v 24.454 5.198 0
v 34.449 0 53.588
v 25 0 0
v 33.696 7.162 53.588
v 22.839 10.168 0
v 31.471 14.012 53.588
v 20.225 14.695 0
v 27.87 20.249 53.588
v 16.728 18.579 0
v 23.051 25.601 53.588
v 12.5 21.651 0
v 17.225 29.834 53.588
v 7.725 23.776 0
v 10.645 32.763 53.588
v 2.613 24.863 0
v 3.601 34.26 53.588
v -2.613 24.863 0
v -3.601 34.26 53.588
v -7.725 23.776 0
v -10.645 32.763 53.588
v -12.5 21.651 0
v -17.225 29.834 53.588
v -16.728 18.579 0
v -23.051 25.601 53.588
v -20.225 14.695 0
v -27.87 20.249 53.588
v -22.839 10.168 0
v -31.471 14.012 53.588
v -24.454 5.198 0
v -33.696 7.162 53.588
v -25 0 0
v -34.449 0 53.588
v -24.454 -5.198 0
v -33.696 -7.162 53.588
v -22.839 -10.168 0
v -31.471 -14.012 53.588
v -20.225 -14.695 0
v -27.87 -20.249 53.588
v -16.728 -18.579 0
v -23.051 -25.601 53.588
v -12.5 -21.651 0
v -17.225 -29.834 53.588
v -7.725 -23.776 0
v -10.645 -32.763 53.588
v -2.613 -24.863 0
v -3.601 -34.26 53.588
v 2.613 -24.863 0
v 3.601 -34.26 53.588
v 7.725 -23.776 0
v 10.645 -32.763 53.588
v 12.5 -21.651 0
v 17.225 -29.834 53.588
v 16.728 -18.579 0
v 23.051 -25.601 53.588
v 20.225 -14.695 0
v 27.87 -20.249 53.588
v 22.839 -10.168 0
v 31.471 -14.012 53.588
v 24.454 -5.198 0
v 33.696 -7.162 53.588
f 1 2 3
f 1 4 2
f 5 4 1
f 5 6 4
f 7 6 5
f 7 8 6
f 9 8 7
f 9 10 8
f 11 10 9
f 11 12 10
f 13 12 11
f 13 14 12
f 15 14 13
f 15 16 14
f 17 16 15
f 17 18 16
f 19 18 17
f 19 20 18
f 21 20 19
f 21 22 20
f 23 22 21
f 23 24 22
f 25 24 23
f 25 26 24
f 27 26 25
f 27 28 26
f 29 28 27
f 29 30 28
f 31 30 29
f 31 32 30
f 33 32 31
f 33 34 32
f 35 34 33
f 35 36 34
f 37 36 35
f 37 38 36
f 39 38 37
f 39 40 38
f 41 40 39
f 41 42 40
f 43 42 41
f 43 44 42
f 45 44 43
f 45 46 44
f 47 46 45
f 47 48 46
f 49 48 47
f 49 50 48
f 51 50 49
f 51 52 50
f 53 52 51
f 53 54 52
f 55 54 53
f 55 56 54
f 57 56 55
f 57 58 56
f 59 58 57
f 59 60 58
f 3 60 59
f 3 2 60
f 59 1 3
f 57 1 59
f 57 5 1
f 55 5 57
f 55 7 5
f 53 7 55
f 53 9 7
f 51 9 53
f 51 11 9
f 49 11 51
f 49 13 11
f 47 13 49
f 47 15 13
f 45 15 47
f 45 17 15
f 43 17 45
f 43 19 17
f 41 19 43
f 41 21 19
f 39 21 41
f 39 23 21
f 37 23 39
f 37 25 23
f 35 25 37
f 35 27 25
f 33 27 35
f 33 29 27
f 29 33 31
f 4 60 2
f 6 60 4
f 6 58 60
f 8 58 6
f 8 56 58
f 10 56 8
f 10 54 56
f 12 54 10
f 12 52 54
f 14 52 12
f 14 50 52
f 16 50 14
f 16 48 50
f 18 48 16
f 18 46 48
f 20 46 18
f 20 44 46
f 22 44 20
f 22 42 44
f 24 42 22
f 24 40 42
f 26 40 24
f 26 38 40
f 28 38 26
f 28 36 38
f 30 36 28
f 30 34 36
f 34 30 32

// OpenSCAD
/* conical frustum
  V: Volume
  h: height
  R: bigger radius
  r: smaller radius
  phi: angle between base and cone axis
  
  V=(h*PI)/3 * (R²+R*r+r²)
  h=(R-r)/tan(phi)
  
  V=((R-r)*PI/tan(phi)*3) * (R²+R*r+r²)
  R(r,V,phi)=((3 V tan(ϕ°))/π + r^3)^(1/3) //by Wolfram Alpha
  */
/* simple cylinder
V=r^2*h*PI

*/

 foodDensity=0.54; //Density in kg/l
 brimHght=15; //Height of brim
 baseDia=50;
 minWallThck=0.4*3;
 fudge=0.1;
 conical=true;
 
 phi=10;
 V1_ltr=0.150; //liter
 V1_mm3=V1_ltr*1e6; //mm³
 
 r=baseDia/2;
 R=((3*V1_mm3*tan(phi))/PI + r^3)^(1/3);
 echo(R);
 
 h_cyl=V1_mm3/(PI*r^2);
 h_con=(R-r)/tan(phi);
 
 conical();
 
 module conical(){
   cylinder(d1=baseDia,d2=R*2,h=h_con);
 }
 
 
module cylindrical(){
  difference(){ 
    union(){
      cylinder(d1=baseDia+minWallThck*2,d2=baseDia+minWallThck*4,h=h_cyl+minWallThck);
      translate([0,0,h1+minWallThck]) cylinder(d=baseDia+minWallThck*4,h_cyl=brimHght);
    }
    translate([0,0,minWallThck]){
      cylinder(d=baseDia,h=h_cyl+fudge);
      translate([0,0,h1]) cylinder(d=baseDia+minWallThck*2,h=brimHght+fudge);
    }
  }
}
